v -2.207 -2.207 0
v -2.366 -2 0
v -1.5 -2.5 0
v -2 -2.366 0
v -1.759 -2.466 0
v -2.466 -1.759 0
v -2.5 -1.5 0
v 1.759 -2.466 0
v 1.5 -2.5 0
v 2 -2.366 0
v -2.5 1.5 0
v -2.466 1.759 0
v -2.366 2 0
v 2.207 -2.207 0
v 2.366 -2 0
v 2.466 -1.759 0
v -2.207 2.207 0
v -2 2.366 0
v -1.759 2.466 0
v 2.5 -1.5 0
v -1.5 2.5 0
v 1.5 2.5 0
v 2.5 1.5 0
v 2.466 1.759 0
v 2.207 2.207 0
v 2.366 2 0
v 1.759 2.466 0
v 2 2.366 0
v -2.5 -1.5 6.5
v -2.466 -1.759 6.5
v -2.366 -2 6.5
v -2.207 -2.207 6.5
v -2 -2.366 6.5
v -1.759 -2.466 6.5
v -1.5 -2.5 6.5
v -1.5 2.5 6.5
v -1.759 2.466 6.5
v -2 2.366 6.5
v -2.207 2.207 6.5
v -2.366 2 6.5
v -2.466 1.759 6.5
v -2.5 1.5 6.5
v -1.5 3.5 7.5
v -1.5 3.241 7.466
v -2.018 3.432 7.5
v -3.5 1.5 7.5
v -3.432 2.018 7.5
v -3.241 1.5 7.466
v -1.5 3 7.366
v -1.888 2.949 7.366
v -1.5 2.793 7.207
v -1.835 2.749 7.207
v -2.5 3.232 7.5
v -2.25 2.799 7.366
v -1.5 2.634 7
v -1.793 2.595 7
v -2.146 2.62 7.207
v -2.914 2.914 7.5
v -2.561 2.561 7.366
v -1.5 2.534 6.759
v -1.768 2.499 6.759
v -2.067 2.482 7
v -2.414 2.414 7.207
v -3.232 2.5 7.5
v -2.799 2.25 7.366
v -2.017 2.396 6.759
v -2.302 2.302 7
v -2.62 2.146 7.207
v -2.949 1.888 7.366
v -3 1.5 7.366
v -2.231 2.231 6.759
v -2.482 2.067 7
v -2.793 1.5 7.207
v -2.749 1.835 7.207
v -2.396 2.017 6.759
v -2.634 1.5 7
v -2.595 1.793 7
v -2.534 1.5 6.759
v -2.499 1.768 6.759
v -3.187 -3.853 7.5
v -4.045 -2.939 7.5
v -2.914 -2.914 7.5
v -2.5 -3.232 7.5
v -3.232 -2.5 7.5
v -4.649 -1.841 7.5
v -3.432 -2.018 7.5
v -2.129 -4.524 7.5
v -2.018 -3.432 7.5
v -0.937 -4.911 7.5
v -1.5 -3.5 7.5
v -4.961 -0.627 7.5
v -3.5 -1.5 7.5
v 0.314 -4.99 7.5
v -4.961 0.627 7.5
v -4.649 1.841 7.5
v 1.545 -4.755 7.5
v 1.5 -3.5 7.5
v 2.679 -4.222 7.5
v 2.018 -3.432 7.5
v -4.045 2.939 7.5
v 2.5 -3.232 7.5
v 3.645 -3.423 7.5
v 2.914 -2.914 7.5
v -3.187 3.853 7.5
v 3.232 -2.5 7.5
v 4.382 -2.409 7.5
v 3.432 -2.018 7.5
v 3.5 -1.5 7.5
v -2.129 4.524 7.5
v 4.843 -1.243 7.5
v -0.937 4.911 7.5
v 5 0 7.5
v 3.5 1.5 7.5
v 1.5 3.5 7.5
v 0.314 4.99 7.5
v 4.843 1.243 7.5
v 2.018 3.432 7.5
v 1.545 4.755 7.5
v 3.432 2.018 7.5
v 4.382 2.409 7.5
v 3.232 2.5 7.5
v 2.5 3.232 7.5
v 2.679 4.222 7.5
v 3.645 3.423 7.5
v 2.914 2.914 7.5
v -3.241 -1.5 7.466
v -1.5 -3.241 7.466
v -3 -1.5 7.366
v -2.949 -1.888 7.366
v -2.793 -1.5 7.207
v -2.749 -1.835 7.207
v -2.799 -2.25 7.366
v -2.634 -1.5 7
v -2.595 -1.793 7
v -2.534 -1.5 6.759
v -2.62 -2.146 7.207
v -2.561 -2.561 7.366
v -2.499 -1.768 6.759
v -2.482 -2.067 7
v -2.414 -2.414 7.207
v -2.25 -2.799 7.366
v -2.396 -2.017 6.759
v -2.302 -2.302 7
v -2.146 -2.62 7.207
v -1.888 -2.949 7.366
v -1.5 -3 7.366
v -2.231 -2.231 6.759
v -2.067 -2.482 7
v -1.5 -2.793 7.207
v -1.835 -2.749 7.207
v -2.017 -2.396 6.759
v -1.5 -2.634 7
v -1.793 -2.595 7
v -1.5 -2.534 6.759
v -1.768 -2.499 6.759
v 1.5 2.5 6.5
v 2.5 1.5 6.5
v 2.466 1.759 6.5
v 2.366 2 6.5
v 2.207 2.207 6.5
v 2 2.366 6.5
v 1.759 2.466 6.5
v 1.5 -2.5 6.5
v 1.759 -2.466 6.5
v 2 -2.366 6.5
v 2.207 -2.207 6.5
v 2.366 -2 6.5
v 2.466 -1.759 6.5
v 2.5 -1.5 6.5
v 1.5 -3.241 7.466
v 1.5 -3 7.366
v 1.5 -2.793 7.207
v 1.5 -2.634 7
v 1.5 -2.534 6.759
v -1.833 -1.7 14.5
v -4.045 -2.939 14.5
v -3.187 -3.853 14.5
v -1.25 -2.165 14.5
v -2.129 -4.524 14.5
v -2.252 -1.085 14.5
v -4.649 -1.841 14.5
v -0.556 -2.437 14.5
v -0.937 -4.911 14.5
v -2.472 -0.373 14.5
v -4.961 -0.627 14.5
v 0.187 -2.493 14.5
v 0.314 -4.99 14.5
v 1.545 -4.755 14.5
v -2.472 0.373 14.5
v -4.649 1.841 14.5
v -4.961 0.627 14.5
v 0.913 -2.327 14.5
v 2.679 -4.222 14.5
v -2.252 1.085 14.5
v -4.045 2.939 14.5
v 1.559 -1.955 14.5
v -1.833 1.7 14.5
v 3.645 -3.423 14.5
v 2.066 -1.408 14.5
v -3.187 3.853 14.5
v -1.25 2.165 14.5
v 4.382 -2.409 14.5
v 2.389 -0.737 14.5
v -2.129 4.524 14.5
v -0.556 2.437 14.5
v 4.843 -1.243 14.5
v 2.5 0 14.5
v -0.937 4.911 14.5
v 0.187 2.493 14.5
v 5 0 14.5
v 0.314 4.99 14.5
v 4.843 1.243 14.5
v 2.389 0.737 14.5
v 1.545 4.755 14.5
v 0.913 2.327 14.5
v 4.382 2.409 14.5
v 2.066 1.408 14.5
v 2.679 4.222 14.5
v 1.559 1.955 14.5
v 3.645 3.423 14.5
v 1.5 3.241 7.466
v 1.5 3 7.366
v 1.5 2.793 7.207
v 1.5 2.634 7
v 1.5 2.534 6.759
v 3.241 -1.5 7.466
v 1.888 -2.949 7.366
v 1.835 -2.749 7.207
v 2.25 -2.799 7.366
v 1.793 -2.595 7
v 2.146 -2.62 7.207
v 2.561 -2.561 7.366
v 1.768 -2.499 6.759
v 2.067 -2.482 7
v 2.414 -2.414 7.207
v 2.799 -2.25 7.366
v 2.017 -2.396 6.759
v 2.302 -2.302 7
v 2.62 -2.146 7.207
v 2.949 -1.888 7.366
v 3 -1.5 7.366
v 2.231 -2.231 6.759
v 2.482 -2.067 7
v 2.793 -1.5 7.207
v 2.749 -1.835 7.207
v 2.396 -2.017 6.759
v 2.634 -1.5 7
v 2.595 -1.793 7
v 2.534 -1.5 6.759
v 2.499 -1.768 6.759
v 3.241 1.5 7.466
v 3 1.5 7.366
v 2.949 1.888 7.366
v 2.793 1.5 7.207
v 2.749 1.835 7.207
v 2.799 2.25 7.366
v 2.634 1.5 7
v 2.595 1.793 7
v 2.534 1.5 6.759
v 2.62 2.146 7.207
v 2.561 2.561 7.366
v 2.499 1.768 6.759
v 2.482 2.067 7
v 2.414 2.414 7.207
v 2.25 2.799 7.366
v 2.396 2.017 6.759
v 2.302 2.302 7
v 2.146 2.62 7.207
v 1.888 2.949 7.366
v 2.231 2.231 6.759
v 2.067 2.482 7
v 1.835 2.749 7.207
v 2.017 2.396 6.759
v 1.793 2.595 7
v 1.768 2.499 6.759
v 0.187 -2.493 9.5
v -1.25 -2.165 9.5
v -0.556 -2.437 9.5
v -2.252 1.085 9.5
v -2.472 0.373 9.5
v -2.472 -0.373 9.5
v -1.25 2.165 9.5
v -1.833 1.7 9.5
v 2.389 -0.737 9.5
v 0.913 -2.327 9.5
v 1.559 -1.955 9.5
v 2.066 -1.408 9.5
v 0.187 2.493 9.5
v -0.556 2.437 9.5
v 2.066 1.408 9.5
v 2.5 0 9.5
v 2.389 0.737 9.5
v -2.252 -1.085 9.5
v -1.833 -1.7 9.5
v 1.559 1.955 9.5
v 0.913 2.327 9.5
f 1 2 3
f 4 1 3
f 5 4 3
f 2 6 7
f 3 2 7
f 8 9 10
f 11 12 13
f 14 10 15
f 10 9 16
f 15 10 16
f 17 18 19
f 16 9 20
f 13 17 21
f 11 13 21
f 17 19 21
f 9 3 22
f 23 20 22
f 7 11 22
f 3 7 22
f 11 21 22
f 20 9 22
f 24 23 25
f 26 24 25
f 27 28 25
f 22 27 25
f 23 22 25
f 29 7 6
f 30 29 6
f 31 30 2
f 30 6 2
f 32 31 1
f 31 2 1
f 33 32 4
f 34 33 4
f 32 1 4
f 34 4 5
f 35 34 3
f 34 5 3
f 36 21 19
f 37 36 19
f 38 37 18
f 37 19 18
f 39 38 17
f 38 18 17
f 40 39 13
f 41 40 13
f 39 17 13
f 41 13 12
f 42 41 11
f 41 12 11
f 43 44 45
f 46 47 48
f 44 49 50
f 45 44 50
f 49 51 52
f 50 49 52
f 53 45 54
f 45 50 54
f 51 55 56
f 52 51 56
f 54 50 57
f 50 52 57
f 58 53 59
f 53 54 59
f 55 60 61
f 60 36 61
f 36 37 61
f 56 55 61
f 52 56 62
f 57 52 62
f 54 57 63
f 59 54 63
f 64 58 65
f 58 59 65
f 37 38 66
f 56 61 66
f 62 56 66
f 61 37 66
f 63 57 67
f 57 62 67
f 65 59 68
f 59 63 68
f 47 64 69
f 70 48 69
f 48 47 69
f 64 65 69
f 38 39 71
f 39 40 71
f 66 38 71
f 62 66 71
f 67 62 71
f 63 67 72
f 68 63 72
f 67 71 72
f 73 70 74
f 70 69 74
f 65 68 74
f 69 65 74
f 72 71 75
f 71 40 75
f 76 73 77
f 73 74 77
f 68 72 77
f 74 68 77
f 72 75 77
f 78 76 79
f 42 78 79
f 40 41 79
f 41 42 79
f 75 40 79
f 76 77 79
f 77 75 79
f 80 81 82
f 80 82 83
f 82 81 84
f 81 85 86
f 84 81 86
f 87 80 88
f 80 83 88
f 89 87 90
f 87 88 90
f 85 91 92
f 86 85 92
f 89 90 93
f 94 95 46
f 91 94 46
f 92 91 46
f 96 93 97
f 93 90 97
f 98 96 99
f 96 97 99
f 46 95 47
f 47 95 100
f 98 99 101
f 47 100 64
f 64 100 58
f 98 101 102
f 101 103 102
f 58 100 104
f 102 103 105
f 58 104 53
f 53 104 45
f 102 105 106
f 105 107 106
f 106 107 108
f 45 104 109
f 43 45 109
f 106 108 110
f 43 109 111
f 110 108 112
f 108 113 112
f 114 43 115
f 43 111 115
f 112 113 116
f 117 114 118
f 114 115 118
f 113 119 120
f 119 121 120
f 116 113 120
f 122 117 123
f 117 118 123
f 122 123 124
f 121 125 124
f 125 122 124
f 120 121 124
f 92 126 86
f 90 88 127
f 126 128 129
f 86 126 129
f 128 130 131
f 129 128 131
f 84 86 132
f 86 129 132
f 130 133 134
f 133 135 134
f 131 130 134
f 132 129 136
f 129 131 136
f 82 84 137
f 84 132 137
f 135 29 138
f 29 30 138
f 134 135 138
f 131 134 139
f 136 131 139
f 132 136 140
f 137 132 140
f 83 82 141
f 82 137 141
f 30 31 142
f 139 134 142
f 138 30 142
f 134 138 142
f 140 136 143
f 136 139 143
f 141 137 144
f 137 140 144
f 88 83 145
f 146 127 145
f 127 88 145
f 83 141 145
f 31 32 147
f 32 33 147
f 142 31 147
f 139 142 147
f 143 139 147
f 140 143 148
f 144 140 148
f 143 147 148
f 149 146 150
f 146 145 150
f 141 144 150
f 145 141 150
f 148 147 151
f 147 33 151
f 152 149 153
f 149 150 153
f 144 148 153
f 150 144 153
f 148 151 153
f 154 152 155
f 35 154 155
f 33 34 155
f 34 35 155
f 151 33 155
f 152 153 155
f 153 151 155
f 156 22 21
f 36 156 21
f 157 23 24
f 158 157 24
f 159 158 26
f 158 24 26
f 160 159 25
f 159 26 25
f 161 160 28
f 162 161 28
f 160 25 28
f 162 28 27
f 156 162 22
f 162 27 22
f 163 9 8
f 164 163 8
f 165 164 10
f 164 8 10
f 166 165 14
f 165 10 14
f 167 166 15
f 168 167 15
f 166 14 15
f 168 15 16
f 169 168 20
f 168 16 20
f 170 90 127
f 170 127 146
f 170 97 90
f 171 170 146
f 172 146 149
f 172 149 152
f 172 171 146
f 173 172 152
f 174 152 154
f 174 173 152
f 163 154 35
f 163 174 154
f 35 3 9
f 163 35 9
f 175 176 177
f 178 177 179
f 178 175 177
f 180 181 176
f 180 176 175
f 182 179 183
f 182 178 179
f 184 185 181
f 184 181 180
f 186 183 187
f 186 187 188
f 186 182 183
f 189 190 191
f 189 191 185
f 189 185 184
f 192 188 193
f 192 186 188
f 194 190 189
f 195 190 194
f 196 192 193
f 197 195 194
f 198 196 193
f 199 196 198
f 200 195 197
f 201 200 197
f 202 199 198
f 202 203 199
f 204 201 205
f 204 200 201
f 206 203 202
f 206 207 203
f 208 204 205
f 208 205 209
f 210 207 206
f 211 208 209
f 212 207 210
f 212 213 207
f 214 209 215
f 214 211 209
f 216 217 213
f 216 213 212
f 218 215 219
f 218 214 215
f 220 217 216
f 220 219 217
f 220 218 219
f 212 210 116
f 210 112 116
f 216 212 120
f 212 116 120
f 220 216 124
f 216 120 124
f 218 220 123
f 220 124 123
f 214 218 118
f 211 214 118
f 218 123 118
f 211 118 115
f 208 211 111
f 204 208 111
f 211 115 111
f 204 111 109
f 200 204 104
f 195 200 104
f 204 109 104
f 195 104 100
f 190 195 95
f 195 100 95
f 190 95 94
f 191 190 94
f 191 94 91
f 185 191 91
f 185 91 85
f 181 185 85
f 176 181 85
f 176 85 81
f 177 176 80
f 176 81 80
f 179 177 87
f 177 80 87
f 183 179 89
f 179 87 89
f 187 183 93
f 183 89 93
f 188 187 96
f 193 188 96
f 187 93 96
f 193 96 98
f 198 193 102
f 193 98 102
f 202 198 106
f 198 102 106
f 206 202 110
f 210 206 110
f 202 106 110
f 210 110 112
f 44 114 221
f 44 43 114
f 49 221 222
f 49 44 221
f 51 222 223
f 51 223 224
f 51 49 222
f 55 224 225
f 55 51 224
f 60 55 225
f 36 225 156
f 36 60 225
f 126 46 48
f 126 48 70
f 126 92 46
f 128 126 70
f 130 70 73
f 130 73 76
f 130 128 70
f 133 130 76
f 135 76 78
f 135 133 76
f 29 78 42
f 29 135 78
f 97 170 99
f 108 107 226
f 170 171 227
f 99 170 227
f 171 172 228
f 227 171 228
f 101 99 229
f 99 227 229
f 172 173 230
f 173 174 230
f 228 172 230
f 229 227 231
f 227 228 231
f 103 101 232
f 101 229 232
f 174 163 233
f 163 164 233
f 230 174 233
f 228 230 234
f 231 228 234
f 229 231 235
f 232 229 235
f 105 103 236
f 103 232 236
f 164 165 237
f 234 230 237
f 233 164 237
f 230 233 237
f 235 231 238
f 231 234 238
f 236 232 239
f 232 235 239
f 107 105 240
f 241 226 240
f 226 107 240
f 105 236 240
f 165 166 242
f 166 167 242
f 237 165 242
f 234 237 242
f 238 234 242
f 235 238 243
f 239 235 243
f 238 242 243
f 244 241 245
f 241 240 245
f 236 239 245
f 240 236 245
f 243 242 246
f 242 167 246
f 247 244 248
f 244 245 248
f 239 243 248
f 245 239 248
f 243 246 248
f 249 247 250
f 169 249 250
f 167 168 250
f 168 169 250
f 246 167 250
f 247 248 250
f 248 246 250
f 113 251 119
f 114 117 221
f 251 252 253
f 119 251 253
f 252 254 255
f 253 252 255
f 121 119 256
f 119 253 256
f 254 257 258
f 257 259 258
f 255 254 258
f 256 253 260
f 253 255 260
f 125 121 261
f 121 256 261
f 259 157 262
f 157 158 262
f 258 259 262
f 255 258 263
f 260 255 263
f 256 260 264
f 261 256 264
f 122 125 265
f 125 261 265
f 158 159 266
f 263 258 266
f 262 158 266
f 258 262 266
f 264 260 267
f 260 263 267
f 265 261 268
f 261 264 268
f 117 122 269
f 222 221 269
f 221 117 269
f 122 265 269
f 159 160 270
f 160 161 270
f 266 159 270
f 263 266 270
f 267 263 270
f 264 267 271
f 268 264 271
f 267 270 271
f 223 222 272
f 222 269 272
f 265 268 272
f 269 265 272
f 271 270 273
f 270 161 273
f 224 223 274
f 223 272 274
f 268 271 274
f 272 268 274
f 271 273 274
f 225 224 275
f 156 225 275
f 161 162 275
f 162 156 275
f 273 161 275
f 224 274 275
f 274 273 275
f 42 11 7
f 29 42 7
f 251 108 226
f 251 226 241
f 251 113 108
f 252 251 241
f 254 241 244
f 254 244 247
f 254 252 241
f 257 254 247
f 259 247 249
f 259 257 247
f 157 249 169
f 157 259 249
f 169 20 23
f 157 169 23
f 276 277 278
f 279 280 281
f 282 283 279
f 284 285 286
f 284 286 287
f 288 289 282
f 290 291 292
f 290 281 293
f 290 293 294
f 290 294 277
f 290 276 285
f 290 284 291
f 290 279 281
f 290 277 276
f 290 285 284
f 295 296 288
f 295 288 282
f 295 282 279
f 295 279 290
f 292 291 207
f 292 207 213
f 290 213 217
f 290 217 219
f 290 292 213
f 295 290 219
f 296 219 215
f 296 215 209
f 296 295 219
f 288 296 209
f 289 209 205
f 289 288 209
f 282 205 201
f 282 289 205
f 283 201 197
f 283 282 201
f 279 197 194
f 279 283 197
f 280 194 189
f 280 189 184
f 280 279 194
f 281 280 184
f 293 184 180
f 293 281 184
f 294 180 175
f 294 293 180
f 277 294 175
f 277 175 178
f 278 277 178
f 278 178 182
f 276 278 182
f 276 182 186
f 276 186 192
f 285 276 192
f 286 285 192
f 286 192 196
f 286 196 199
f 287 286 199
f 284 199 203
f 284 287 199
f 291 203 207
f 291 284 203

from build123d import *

# Parameters (mm, degrees)
BOSS_EXTRUDE1_DEPTH = 7.5
SKETCH2_R           = 5
BOSS_EXTRUDE2_DEPTH = 2
SKETCH3_R           = 5
SKETCH3_R_2         = 2.5
BOSS_EXTRUDE3_DEPTH = 5
FILLET1_R           = 1


with BuildPart() as part:
    # Sketch1 → Boss-Extrude1 (new body)
    with BuildSketch(Plane.XY):
        with BuildLine():
            Line((-1.5, -2.5), (1.5, -2.5))
            ThreePointArc((1.5, -2.5), (2.207106781, -2.207106781), (2.5, -1.5))
            Line((2.5, -1.5), (2.5, 1.5))
            ThreePointArc((2.5, 1.5), (2.207106781, 2.207106781), (1.5, 2.5))
            Line((1.5, 2.5), (-1.5, 2.5))
            ThreePointArc((-1.5, 2.5), (-2.207106781, 2.207106781), (-2.5, 1.5))
            Line((-2.5, 1.5), (-2.5, -1.5))
            ThreePointArc((-2.5, -1.5), (-2.207106781, -2.207106781), (-1.5, -2.5))
        make_face()
    extrude(amount=BOSS_EXTRUDE1_DEPTH)

    # Sketch2 → Boss-Extrude2 (add)
    with BuildSketch(Plane.XY.offset(7.5)):
        Circle(SKETCH2_R)
    extrude(amount=BOSS_EXTRUDE2_DEPTH)

    # Sketch3 → Boss-Extrude3 (add)
    with BuildSketch(Plane.XY.offset(9.5)):
        Circle(SKETCH3_R)
        Circle(SKETCH3_R_2, mode=Mode.SUBTRACT)
    extrude(amount=BOSS_EXTRUDE3_DEPTH)

    # Fillet1
    fillet1_edges = [part.edges().sort_by_distance(p)[0] for p in [
        (-2.207106781, 2.207106781, 7.5),
        (-2.5, 0, 7.5),
        (-2.207106781, -2.207106781, 7.5),
        (0, -2.5, 7.5),
        (2.207106781, -2.207106781, 7.5),
        (2.5, 0, 7.5),
        (2.207106781, 2.207106781, 7.5),
        (0, 2.5, 7.5),
    ]]
    fillet(fillet1_edges, radius=FILLET1_R)


solid = part.part
